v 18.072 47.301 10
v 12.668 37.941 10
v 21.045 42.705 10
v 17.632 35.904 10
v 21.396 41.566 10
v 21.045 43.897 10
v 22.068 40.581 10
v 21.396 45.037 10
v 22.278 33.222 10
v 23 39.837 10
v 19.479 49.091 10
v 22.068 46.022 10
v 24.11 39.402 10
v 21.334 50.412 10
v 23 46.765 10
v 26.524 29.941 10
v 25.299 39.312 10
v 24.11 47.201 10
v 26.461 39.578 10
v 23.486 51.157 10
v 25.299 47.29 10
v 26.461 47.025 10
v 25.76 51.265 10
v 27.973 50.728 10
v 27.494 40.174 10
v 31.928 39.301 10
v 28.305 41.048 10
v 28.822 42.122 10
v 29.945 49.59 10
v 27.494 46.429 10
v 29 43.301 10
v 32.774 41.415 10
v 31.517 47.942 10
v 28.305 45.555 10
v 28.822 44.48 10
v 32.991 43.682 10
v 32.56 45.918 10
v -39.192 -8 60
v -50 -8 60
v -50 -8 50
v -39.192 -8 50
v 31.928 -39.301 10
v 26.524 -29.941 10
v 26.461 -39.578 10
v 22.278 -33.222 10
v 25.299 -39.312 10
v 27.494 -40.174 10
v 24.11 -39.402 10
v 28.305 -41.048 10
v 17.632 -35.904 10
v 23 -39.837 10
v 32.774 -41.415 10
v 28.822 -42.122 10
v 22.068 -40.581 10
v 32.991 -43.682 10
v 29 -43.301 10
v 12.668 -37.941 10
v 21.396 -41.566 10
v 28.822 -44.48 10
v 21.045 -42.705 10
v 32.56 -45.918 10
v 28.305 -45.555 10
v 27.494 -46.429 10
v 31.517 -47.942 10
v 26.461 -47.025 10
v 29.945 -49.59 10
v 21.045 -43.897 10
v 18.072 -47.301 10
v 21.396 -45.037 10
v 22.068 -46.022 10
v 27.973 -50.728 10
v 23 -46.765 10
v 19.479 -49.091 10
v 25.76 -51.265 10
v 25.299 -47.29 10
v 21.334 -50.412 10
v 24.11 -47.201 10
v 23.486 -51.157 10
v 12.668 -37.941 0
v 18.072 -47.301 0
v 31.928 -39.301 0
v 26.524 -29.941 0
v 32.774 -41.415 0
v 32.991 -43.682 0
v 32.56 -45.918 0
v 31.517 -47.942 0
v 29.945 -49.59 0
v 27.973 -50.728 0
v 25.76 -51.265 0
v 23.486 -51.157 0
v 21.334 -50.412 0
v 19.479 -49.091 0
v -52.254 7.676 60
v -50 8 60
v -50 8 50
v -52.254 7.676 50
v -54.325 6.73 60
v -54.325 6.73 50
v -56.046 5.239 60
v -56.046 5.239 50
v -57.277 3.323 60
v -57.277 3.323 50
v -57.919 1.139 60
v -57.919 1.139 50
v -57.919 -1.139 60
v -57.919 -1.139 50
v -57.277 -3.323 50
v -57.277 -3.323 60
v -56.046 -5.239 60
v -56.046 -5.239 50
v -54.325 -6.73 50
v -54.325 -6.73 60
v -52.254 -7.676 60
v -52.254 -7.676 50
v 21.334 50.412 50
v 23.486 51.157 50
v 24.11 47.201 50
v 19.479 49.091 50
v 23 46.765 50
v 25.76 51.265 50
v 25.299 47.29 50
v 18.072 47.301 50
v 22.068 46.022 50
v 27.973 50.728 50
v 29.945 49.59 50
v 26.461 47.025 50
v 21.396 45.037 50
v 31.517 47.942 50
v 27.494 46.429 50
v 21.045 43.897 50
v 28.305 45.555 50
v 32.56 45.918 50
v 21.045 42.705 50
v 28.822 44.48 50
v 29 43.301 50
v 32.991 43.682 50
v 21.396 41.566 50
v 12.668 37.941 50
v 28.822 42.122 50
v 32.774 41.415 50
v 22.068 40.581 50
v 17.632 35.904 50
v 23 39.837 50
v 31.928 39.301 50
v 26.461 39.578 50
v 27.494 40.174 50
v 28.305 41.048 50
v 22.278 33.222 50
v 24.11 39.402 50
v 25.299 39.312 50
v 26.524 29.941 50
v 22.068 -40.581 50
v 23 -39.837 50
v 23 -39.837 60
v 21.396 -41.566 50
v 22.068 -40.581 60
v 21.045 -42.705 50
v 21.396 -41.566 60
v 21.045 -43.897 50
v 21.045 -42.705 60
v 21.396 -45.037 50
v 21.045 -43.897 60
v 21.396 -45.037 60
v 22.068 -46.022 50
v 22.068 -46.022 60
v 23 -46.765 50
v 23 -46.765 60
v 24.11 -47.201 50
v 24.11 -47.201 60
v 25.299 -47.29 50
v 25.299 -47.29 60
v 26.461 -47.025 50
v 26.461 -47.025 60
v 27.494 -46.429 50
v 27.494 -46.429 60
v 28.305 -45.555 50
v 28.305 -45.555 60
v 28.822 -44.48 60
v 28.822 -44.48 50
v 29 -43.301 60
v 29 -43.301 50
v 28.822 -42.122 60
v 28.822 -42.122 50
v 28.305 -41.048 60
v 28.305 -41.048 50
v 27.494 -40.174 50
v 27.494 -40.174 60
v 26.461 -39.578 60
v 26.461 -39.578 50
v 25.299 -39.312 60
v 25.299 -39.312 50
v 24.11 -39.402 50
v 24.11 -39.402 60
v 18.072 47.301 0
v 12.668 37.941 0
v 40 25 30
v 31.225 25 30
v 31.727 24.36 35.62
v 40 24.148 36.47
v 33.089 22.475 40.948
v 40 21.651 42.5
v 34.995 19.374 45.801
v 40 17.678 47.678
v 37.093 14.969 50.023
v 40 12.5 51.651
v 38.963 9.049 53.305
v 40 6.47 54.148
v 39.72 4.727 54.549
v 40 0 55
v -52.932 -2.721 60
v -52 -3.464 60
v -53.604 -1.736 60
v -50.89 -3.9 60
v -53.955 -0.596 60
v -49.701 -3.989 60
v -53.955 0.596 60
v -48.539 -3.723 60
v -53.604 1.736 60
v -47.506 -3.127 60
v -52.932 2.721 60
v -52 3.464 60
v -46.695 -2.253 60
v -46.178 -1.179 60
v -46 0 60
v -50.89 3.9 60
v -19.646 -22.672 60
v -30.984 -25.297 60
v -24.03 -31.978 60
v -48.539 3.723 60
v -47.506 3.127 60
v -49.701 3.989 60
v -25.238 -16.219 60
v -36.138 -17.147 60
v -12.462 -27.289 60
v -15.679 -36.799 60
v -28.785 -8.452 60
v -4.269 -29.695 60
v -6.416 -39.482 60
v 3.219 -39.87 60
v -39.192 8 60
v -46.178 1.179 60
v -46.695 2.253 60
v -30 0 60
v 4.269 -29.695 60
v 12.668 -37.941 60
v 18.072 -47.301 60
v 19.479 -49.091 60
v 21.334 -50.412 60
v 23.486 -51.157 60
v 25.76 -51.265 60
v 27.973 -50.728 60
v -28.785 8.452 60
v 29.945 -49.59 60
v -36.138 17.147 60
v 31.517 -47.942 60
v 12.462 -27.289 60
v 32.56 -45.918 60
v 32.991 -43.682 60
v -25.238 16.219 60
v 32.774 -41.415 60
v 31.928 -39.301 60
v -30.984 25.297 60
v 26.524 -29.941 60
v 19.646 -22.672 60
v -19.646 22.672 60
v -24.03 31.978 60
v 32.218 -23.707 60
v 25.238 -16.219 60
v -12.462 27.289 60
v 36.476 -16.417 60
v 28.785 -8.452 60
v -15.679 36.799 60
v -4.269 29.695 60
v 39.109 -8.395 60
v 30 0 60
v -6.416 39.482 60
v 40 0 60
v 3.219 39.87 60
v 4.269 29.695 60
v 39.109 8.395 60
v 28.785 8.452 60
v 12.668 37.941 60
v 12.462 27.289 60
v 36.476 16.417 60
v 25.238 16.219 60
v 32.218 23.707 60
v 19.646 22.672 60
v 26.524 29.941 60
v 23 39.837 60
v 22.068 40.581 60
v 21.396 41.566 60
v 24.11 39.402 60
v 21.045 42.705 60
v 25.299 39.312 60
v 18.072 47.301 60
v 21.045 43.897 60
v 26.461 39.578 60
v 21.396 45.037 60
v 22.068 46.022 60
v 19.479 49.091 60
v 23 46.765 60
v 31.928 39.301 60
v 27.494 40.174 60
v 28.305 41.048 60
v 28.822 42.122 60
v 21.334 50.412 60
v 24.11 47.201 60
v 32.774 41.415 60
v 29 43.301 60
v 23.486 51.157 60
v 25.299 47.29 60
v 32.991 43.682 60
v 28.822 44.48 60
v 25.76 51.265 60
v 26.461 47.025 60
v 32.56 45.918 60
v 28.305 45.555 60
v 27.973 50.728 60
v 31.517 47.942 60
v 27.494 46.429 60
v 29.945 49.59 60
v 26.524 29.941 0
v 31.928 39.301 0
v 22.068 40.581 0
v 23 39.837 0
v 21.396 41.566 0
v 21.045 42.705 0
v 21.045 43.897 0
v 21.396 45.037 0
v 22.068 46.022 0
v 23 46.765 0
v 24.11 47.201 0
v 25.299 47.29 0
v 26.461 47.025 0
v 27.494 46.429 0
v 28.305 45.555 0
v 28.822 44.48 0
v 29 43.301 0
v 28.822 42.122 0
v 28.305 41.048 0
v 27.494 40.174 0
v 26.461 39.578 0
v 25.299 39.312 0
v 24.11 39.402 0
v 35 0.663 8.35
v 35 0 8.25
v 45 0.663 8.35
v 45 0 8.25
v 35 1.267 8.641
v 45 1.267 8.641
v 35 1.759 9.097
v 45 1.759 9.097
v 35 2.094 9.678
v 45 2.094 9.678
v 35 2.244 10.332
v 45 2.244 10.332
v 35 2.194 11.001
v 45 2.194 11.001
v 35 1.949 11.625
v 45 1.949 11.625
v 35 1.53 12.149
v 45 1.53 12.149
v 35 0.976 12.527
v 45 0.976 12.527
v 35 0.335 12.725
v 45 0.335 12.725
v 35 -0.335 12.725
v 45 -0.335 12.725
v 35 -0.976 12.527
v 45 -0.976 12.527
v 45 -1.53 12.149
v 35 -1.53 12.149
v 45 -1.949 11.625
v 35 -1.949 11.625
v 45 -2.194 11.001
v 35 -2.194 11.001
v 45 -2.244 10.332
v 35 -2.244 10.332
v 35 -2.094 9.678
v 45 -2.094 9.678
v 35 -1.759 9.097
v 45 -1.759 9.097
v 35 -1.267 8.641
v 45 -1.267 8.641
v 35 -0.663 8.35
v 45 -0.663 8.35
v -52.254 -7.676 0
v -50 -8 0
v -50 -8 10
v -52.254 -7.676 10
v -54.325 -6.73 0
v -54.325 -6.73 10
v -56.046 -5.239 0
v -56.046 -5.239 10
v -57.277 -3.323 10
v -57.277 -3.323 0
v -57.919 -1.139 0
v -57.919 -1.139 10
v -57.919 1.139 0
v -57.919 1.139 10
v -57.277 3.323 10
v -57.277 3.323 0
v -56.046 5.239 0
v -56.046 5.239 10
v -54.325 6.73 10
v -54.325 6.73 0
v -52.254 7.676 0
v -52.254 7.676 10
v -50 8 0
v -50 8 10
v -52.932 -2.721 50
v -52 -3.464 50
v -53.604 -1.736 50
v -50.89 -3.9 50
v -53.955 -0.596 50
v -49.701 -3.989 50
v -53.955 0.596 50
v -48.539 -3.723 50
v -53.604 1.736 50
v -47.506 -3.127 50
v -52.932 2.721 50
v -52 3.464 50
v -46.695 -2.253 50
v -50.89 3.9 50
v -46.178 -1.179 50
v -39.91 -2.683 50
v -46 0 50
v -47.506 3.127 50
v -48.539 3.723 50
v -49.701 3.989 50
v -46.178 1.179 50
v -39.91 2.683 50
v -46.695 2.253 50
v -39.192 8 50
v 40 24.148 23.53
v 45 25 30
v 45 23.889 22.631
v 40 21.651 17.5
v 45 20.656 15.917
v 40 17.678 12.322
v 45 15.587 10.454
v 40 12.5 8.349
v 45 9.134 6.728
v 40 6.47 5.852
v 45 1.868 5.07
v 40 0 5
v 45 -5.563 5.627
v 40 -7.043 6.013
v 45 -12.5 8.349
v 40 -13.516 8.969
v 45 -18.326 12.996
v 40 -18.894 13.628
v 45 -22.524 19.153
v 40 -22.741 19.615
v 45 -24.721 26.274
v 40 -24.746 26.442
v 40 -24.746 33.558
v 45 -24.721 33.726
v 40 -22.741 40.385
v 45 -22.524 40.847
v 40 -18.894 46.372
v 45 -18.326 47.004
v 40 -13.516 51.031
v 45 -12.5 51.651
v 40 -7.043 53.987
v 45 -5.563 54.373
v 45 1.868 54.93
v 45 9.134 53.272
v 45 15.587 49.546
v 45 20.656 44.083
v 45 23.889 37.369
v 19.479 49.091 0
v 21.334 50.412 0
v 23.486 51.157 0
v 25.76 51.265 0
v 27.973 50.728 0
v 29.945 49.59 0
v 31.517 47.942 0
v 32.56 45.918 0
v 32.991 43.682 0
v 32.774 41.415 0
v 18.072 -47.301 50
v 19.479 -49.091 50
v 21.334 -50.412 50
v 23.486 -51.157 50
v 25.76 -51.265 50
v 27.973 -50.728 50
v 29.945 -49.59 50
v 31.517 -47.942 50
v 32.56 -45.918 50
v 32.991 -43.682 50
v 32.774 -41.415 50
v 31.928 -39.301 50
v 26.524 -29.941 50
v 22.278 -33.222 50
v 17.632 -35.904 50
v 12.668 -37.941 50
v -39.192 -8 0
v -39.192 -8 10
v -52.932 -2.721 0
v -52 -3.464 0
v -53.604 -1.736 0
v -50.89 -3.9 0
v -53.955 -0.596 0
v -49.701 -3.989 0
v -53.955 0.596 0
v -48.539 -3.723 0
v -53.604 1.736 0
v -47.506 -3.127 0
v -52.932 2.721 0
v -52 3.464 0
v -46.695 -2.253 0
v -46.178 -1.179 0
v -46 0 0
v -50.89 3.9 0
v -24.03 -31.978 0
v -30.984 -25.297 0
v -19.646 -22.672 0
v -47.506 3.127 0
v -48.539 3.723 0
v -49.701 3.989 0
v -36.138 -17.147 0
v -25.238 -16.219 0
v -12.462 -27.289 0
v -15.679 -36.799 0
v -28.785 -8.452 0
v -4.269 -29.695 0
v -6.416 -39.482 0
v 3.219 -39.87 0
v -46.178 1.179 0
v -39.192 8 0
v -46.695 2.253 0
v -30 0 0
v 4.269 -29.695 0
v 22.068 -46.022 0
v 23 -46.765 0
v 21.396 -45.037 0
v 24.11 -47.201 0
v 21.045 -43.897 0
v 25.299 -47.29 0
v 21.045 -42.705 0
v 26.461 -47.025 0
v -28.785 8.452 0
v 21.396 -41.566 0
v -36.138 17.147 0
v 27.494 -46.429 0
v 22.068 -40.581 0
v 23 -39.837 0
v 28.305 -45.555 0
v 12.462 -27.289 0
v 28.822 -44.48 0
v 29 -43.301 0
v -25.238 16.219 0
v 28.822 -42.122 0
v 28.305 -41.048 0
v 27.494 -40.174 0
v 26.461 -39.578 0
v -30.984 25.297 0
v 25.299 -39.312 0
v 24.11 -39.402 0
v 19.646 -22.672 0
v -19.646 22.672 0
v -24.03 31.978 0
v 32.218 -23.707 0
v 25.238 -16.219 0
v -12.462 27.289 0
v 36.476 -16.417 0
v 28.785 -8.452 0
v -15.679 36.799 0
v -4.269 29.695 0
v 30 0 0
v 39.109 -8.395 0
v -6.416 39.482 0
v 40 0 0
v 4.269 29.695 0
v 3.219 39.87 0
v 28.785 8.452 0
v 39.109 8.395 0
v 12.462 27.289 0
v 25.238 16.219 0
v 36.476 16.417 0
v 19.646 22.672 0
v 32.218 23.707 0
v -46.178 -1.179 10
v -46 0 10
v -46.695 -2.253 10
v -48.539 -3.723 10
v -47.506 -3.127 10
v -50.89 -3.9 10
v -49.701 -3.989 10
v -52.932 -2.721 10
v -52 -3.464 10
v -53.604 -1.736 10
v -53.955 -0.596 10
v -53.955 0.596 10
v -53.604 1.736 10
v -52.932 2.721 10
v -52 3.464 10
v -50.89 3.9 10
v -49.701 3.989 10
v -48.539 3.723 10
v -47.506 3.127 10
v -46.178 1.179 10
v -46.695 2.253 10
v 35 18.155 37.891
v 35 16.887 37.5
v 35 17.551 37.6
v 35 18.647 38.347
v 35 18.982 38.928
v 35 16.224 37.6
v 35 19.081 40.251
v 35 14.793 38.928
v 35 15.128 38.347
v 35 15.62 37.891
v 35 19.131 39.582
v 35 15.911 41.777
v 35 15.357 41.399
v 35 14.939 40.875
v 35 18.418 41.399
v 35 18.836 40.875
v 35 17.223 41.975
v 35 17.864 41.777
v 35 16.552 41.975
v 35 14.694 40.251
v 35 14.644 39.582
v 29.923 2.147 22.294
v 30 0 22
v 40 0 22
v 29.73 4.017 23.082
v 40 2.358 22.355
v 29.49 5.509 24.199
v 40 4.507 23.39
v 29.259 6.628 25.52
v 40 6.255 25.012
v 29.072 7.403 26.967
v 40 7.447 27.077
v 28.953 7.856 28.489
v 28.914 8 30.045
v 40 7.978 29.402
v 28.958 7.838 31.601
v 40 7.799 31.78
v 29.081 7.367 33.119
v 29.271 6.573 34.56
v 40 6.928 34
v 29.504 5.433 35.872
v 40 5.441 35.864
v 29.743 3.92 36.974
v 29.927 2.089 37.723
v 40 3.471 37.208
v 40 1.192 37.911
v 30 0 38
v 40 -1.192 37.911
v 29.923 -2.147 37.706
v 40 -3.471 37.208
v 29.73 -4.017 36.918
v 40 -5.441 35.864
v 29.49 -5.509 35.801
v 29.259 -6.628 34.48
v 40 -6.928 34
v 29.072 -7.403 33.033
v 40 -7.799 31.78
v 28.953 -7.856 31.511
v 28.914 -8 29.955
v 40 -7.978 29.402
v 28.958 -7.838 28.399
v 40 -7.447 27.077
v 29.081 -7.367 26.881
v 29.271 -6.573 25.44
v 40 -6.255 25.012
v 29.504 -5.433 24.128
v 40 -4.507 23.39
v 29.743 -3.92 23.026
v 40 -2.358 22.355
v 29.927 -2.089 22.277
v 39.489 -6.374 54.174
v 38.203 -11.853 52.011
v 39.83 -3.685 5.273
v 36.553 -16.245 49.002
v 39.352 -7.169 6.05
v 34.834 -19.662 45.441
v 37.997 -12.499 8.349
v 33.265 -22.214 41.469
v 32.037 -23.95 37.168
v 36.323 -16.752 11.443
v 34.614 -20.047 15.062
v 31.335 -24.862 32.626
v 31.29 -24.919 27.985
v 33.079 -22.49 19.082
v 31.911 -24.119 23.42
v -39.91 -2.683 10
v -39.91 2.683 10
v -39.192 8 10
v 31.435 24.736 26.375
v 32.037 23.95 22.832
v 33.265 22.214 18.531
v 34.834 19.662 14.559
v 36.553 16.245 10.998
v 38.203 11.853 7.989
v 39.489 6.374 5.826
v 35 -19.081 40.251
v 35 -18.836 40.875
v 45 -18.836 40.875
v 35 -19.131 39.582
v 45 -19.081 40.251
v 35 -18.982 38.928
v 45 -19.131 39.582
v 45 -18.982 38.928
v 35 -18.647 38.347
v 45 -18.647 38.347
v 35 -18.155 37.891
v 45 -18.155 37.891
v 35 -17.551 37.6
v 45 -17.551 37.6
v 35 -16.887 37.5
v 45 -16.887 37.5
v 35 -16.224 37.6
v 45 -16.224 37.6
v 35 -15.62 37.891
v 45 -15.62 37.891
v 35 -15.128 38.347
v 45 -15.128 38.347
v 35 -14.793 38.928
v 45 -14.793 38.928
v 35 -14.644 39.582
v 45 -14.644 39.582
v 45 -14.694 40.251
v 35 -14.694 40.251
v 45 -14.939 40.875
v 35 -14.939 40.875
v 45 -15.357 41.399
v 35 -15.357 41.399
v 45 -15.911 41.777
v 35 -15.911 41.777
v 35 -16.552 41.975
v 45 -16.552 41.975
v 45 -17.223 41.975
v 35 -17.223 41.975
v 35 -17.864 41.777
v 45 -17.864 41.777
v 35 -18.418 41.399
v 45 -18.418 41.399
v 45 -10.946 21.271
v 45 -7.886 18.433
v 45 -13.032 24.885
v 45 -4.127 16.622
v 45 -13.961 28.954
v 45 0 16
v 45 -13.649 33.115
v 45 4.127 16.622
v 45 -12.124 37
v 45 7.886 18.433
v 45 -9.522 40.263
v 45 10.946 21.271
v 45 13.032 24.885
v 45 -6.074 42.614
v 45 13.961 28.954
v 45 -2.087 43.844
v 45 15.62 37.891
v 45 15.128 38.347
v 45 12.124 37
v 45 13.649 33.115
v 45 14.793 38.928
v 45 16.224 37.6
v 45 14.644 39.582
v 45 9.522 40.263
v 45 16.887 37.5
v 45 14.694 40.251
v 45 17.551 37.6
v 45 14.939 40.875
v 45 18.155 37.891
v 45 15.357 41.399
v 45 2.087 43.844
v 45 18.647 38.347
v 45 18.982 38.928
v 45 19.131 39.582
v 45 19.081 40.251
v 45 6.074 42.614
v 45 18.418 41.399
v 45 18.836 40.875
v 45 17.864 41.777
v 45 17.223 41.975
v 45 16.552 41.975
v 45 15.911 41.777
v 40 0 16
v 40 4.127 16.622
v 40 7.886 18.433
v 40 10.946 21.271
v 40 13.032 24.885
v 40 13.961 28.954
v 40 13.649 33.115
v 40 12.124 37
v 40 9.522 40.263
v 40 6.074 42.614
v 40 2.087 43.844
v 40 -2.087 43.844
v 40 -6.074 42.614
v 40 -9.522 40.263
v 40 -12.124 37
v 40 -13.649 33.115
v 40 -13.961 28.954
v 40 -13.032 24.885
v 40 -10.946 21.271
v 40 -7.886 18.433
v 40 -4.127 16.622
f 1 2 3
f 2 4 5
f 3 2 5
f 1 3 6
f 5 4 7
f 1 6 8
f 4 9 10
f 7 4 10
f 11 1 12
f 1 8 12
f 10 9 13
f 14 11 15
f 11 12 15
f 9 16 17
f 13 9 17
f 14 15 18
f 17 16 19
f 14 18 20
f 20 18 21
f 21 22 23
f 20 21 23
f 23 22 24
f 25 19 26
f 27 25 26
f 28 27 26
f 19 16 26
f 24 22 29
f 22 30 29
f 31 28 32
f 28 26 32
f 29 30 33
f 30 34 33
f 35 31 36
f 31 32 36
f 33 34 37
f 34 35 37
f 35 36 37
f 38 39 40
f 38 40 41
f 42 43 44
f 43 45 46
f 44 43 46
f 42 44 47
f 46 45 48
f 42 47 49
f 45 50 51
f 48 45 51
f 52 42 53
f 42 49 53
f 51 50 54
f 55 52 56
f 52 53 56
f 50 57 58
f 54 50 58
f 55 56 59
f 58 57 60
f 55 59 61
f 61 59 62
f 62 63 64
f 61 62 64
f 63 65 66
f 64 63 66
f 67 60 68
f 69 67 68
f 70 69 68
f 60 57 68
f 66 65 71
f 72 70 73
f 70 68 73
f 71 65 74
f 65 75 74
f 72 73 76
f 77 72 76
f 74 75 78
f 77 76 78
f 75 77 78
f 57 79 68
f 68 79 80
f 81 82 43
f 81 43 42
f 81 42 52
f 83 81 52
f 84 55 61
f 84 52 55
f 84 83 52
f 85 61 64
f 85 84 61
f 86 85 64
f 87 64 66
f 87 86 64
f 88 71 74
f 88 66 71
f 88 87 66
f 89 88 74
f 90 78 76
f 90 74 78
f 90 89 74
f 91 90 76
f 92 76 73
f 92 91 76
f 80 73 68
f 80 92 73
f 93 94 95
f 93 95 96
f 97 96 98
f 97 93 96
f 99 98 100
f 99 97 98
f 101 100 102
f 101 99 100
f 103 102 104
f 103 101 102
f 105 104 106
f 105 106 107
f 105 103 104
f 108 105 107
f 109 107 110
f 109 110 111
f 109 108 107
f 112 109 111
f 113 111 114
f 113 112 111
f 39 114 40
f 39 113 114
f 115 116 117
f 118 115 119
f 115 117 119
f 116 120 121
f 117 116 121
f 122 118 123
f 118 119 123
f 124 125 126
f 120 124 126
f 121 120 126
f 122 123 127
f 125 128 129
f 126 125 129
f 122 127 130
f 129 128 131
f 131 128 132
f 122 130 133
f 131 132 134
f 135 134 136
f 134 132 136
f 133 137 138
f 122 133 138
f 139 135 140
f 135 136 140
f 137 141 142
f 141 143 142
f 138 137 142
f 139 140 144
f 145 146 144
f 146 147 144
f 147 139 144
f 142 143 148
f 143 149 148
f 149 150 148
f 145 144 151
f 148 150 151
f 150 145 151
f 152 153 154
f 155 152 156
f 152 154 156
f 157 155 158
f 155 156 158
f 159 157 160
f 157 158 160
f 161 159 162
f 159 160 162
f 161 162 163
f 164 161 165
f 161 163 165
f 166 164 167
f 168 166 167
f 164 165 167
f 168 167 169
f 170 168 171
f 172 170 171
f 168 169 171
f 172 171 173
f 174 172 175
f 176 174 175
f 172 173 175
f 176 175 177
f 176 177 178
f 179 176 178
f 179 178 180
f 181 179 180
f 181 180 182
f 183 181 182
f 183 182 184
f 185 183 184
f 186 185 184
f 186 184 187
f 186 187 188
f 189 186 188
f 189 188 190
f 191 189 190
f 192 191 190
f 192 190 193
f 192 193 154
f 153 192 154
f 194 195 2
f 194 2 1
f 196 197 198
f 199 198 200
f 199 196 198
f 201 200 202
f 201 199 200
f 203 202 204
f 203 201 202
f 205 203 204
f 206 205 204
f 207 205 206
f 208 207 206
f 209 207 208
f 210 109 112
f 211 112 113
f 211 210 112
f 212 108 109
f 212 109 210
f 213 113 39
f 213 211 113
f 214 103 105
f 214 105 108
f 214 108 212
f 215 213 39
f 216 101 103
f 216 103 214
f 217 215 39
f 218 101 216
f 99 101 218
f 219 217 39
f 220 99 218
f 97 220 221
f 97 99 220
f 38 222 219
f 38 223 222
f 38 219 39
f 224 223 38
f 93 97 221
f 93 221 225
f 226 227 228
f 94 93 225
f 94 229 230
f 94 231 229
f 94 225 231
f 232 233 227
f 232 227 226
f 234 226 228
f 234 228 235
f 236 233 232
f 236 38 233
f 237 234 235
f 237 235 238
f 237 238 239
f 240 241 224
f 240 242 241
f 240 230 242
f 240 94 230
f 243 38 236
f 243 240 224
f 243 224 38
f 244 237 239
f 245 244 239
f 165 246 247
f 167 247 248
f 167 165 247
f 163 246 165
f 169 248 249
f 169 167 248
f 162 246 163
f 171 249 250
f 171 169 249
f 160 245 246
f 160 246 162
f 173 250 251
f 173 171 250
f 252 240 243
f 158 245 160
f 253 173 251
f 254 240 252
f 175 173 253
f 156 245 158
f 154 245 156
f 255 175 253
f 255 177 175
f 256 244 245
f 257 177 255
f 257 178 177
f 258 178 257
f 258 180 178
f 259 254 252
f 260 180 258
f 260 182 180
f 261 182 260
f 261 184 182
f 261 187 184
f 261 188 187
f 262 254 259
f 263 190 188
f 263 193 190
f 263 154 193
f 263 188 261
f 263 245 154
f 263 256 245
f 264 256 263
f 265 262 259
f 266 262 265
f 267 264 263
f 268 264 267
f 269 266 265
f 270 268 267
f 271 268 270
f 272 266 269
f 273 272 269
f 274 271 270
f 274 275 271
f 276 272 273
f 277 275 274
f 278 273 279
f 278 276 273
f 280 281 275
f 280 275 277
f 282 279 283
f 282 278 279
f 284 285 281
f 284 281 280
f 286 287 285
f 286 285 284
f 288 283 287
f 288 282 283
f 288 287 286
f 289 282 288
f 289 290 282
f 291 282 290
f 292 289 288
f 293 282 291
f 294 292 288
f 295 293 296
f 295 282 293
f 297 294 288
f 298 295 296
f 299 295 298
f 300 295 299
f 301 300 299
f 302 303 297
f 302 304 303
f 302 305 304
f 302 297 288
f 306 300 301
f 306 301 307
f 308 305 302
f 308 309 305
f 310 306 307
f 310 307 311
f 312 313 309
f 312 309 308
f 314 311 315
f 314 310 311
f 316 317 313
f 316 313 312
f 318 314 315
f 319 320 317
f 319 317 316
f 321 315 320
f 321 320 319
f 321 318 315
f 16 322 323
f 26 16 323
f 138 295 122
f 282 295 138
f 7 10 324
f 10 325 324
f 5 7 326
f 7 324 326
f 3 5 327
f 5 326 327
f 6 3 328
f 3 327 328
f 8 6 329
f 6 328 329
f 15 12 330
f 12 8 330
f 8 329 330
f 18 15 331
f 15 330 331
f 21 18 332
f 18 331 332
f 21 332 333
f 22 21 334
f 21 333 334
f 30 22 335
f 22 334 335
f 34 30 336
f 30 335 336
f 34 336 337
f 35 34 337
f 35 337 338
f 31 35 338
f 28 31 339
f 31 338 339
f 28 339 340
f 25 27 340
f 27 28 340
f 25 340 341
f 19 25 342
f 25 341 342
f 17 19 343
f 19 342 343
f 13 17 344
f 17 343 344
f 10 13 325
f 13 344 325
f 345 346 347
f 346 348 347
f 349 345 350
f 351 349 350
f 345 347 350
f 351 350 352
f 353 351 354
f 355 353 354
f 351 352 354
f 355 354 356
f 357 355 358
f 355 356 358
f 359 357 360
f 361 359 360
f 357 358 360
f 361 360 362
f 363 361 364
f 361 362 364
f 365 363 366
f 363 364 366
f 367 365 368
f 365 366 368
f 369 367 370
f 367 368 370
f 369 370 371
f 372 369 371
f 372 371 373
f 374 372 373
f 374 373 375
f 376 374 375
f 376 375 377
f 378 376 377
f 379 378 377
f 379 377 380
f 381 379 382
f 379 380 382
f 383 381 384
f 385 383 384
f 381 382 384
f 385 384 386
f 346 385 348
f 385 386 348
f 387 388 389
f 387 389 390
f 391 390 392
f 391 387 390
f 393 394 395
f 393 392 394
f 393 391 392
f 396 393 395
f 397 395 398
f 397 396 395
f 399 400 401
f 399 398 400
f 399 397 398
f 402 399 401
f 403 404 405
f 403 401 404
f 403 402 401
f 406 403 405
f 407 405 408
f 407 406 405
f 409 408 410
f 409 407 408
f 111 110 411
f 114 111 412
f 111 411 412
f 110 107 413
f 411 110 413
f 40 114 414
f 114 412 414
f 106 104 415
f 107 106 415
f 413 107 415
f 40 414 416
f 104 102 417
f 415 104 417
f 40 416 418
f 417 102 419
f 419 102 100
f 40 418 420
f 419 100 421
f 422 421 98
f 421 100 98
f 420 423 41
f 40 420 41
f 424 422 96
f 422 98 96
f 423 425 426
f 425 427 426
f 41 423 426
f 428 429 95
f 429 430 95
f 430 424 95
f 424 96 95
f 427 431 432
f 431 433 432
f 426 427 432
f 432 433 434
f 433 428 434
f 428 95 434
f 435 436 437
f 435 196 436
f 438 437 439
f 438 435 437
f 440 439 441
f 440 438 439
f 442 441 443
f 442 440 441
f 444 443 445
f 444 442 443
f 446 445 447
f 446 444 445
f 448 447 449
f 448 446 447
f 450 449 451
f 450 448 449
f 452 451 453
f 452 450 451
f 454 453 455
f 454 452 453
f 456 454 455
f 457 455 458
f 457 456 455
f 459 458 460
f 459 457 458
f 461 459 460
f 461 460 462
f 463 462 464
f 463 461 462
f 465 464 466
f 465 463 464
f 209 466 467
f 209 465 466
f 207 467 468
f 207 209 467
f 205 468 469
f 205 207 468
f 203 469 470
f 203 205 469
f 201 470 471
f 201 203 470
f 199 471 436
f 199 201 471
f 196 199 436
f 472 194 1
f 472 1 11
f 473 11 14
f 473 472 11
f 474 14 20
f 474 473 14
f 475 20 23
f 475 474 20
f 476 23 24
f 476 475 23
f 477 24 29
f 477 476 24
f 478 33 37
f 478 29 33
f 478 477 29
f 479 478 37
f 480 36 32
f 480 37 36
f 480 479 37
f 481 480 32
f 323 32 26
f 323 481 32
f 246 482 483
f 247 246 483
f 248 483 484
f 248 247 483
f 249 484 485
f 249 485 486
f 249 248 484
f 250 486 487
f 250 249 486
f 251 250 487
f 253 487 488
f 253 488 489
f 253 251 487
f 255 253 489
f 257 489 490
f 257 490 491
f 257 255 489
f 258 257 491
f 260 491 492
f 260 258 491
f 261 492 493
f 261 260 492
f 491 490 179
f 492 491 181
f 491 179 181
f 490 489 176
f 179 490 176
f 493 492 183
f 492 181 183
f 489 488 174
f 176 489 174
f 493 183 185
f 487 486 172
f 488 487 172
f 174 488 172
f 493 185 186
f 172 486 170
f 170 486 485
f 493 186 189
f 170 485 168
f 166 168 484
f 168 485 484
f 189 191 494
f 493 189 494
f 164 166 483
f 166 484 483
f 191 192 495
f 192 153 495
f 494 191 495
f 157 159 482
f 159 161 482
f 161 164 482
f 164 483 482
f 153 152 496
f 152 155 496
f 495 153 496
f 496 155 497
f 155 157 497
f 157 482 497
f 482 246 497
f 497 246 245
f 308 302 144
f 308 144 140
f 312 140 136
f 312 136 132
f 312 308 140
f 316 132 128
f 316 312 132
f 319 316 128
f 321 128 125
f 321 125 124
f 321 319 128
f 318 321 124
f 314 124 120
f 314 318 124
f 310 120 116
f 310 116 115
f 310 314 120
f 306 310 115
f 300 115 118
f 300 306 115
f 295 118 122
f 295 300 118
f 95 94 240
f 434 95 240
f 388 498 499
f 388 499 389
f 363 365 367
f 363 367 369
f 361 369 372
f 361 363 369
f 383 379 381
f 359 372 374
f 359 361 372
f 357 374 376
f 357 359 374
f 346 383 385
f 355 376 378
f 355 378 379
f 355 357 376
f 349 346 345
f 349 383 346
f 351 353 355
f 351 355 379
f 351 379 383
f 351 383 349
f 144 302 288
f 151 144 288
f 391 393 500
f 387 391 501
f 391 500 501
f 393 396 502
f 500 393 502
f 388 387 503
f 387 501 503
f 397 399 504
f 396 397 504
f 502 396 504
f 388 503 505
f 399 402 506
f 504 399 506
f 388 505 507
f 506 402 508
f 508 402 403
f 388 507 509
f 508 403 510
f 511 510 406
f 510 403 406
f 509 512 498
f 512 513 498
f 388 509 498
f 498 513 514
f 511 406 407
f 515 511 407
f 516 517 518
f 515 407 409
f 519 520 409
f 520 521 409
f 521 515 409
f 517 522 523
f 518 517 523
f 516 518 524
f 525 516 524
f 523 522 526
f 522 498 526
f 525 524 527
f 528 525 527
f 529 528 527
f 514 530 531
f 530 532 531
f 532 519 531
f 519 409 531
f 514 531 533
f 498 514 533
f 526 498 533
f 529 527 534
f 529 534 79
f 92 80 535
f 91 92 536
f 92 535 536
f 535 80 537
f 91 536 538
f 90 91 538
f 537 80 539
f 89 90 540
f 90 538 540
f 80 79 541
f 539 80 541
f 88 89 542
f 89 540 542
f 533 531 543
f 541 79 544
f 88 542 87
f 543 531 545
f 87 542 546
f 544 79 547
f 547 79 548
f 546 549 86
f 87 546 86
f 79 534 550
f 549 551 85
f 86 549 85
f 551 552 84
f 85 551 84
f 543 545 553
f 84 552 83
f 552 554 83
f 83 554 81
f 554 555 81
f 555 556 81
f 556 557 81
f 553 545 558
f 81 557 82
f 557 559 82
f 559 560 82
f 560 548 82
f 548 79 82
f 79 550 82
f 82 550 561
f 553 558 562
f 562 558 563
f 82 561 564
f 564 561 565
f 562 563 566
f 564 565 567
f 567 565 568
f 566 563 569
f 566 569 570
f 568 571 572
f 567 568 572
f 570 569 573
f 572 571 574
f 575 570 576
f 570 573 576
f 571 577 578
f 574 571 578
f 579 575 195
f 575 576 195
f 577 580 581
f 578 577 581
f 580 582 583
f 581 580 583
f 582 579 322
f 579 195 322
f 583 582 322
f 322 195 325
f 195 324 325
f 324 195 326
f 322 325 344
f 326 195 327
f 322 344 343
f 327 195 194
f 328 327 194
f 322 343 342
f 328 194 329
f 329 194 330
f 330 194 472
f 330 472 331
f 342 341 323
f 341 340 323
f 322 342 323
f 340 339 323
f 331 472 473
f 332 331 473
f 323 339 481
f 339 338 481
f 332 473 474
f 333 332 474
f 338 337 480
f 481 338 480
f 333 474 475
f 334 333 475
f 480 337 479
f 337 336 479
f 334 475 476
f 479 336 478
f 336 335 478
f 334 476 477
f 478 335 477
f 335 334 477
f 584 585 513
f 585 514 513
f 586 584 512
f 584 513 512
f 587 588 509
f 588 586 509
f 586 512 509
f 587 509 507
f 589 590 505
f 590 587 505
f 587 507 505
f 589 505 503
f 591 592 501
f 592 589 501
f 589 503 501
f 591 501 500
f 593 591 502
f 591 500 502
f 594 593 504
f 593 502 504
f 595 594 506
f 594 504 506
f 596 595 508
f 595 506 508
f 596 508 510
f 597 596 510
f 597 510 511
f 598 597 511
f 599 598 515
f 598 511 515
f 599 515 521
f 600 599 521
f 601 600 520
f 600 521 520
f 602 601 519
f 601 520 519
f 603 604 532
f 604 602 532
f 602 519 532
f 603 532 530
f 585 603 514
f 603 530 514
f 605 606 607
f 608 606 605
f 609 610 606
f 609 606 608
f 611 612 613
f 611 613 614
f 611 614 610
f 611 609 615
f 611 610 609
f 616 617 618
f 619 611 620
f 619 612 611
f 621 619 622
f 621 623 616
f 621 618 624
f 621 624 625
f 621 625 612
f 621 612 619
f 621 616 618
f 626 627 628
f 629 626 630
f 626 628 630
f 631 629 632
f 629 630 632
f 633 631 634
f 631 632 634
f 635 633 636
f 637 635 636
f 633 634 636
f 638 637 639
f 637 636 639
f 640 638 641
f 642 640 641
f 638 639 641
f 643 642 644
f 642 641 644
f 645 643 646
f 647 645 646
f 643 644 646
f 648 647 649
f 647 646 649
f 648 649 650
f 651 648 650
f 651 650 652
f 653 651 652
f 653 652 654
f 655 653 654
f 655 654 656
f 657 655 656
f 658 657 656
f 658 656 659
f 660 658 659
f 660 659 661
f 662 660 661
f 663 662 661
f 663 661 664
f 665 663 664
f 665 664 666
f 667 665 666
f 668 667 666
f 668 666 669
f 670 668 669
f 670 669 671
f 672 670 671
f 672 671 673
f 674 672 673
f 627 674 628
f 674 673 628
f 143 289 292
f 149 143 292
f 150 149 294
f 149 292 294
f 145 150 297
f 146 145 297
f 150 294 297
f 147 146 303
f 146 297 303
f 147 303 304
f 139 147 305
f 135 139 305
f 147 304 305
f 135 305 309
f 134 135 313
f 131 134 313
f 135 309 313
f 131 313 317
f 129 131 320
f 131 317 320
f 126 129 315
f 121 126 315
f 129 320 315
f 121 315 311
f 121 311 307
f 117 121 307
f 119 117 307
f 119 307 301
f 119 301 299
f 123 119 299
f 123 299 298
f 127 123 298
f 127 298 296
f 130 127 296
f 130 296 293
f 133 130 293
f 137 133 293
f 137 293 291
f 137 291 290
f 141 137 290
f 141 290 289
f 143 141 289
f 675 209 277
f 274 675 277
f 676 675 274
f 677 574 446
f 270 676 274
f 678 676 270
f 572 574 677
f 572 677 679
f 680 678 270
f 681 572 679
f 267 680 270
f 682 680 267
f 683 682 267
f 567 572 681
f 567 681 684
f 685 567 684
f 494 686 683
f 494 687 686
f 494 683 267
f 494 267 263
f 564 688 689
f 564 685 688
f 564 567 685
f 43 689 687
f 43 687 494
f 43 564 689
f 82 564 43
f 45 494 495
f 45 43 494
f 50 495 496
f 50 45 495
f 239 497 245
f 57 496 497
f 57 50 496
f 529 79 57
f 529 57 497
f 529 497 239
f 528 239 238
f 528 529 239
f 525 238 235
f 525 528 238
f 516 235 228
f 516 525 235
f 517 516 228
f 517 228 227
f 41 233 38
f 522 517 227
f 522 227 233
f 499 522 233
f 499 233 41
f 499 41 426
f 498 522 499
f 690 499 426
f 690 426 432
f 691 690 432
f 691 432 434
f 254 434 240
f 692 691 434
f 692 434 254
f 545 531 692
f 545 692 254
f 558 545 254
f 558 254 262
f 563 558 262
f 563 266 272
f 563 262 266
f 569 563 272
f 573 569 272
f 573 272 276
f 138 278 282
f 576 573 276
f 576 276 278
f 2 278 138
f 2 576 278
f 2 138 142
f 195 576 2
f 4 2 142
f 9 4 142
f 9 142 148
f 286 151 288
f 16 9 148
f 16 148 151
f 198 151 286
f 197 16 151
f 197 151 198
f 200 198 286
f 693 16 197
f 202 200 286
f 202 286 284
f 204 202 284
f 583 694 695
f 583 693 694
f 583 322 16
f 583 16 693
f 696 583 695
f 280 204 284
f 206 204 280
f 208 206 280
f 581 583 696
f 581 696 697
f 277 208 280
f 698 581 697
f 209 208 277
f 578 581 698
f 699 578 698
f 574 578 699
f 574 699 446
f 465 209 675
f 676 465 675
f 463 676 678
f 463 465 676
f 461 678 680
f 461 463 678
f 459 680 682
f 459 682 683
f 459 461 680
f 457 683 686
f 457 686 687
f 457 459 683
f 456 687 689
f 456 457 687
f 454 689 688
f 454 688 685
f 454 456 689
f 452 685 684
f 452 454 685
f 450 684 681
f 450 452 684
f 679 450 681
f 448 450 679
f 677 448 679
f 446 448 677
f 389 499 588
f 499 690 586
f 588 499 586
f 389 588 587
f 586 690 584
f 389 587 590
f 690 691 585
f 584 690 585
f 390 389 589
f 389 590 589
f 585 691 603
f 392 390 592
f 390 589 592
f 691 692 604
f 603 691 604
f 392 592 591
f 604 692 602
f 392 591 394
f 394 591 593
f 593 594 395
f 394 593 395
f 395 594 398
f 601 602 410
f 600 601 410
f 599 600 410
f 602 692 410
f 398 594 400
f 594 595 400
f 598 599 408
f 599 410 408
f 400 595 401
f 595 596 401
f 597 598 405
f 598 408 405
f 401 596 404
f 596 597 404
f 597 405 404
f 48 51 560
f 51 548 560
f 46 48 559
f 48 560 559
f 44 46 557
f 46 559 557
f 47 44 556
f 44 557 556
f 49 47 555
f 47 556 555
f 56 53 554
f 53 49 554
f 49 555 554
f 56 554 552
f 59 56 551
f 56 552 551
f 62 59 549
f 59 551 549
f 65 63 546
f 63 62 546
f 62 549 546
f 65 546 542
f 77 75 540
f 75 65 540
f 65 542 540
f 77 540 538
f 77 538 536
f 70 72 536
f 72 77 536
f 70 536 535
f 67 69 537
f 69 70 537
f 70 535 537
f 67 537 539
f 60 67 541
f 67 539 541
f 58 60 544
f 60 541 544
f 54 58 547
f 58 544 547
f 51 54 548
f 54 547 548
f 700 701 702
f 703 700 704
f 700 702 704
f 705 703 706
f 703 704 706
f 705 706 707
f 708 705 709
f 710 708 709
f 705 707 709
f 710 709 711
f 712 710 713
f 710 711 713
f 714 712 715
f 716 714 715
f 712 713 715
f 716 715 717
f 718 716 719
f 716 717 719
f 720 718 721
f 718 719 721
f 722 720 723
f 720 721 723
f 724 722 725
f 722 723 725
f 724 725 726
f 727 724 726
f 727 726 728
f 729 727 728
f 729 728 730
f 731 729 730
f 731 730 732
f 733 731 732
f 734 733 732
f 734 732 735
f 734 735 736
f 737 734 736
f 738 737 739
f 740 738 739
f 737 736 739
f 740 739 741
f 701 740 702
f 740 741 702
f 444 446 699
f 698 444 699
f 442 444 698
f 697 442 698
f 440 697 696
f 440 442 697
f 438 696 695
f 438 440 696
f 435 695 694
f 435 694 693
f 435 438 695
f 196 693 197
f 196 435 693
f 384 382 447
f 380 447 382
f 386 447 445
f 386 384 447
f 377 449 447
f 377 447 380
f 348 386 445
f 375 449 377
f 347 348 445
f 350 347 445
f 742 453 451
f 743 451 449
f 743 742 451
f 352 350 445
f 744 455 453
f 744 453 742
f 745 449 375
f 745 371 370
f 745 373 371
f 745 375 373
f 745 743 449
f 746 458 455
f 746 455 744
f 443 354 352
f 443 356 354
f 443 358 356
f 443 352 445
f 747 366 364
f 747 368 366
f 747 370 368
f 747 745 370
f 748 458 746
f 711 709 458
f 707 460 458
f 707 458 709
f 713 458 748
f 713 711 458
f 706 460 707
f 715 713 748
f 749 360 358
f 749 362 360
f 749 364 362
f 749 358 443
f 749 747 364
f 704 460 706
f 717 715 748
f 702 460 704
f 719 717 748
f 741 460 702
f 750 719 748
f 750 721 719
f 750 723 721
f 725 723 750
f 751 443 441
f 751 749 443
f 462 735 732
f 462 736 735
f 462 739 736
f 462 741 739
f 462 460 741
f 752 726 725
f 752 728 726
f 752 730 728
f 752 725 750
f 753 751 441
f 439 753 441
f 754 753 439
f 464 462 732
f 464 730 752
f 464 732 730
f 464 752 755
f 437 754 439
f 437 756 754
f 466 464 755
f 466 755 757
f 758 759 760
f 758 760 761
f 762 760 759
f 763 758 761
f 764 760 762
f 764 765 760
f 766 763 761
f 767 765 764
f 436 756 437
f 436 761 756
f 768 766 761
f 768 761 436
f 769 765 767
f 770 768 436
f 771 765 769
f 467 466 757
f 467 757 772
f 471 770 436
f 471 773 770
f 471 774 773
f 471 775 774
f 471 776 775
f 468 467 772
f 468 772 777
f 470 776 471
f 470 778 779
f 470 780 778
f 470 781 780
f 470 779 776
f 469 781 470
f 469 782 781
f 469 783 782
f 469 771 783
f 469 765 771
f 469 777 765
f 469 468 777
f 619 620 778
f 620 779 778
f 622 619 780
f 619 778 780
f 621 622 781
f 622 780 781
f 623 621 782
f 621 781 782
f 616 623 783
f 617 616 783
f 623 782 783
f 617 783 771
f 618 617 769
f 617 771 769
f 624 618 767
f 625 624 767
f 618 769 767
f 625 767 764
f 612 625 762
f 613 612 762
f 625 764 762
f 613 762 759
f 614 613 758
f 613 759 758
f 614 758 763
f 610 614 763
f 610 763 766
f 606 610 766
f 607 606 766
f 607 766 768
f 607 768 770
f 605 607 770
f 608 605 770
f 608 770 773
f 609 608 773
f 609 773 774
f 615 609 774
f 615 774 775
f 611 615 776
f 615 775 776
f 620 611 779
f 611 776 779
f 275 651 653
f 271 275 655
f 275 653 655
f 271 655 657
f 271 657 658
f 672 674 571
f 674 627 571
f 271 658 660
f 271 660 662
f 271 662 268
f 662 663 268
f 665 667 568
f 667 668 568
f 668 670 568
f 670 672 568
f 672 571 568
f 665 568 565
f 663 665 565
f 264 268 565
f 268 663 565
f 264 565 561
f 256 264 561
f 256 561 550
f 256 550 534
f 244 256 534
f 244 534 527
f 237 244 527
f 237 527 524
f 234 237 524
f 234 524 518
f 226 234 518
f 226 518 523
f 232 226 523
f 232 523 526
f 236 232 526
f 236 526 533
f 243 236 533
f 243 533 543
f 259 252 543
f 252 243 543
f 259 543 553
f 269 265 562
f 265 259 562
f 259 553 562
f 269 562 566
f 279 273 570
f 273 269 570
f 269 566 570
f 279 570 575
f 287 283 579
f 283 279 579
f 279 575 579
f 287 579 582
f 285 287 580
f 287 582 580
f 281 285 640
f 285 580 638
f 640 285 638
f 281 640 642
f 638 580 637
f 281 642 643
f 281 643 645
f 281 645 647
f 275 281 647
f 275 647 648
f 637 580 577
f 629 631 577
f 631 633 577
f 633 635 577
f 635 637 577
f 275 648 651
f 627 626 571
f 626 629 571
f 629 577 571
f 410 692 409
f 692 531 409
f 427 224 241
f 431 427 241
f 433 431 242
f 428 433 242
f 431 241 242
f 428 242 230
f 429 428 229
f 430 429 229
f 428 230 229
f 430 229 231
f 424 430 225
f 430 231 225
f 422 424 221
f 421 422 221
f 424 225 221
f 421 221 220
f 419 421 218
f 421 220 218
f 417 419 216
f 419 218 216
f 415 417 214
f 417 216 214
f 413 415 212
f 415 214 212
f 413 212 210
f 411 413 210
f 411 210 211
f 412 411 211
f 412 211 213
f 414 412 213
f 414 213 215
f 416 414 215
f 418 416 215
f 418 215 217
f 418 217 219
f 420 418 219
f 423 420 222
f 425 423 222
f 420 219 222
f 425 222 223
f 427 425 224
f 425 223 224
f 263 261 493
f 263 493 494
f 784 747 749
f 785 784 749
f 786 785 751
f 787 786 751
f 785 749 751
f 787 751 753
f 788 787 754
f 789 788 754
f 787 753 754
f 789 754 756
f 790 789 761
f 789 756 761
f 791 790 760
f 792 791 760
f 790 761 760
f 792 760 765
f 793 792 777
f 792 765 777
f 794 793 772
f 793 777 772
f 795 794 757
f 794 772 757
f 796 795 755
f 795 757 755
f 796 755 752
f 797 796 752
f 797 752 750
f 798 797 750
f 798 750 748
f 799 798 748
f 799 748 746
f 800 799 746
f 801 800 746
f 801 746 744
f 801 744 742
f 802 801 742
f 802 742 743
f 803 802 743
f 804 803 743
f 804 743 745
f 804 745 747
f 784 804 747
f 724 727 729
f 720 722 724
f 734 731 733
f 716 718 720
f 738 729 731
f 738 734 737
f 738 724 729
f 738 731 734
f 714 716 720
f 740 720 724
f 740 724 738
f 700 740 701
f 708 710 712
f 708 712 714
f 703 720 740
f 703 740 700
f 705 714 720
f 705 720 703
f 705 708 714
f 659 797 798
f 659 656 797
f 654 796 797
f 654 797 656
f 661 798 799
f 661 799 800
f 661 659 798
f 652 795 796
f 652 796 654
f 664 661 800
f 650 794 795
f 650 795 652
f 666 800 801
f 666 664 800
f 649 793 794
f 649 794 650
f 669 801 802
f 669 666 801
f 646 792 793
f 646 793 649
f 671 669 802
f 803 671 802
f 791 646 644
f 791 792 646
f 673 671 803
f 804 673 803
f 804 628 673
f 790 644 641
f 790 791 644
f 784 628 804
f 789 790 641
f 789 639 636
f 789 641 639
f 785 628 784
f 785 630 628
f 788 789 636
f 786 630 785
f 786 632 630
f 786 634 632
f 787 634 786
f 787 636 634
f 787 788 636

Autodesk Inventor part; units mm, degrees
ref_plane "XZ Plane" through (0, 0, 0) normal (0, 1, 0) x (-1, 0, 0)
sketch "Esboço1" plane through (0, 0, 0) normal (0, 0, 1) x (1, 0, 0)
  circle A0 centre (0, 0) radius 30
  circle A1 centre (0, 0) radius 40
  dimension "d0" = 60
  dimension "d1" = 80
extrude "Extrusão1" add sketch "Esboço1" along normal blind 60
sketch "Esboço2" plane through (0, 0, 60) normal (0, 0, 1) x (1, 0, 0)
  circle A0 centre (-50, 0) radius 4
  arc A1 (-50, 8) -> (-50, -8) centre (-50, 0) ccw
  line L0 (-50, 8) -> (-39.1918, 8)
  circle A2 centre (0, 0) radius 40 projected
  line L1 (-50, -8) -> (-39.1918, -8)
  arc A3 (-39.1918, 8) -> (-39.1918, -8) centre (0, 0) ccw
  dimension "d4" = 8
  dimension "d5" = 16
  dimension "d6" = 50
extrude "Extrusão2" add sketch "Esboço2" against normal blind 10 contours L0 A2 L1 A1
pattern_circular "Padrão circular1" count 3 over 360 about axis through (0, 0, 0) along (0, 0, 1) of "Extrusão2"
ref_plane "Plano de trabalho1" through (0, 0, 30) normal (0, 0, 1) x (1, 0, 0)
mirror "Espelhamento1" about plane through (0, 0, 30) normal (0, 0, 1) of "Extrusão2", "Padrão circular1", "Extrusão1"
ref_plane "Plano de trabalho2" through (40, 0, 0) normal (1, 0, 0) x (0, 1, 0)
sketch "Esboço3" plane through (40, 0, 0) normal (1, 0, 0) x (0, 1, 0)
  line L0 (0, 0) -> (0, 60) construction
  line L1 (-4, 60) -> (4, 60) construction
  circle A0 centre (0, 30) radius 25
  dimension "d14" = 50
extrude "Extrusão3" add sketch "Esboço3" along normal blind 5 and the other way blind 10
sketch "Esboço4" plane through (45, 0, 30) normal (1, 0, 0) x (0, 0, -1)
  circle A0 centre (0, 0) radius 8
  point P0 (30, 0)
  dimension "d19" = 16
extrude "Extrusão4" cut sketch "Esboço4" against normal up to next
sketch "Esboço5" plane through (45, 0, 30) normal (1, 0, 0) x (0, 0, -1)
  circle A0 centre (0, 0) radius 14
  circle A1 centre (0, 0) radius 8
  point P0 (30, 0)
  dimension "d22" = 28
  dimension "d23" = 16
extrude "Extrusão5" cut sketch "Esboço5" against normal blind 5
sketch "Esboço6" plane through (45, 0, 30) normal (1, 0, 0) x (0, 0, -1)
  circle A0 centre (0, 0) radius 14 construction
  line L0 (14, 0) -> (25, 0) construction
  circle A1 centre (0, 0) radius 25 construction
  circle A2 centre (19.5, 0) radius 2.25
  point P0 (30, 0)
  dimension "d26" = 4.5
extrude "Extrusão6" cut sketch "Esboço6" against normal blind 10
pattern_circular "Padrão circular2" count 3 over 360 about axis through (45, 0, 30) along (-1, 0, 0) of "Extrusão6"
thread "Rosca1" size "M4.5x0.5" class "6H" standard "ANSI Metric M Profile" length 3
thread "Rosca2" size "M4.5x0.5" class "6H" standard "ANSI Metric M Profile" length 3
thread "Rosca3" size "M4.5x0.5" class "6H" standard "ANSI Metric M Profile" length 3
properties part number "Corpo da Valvula"
